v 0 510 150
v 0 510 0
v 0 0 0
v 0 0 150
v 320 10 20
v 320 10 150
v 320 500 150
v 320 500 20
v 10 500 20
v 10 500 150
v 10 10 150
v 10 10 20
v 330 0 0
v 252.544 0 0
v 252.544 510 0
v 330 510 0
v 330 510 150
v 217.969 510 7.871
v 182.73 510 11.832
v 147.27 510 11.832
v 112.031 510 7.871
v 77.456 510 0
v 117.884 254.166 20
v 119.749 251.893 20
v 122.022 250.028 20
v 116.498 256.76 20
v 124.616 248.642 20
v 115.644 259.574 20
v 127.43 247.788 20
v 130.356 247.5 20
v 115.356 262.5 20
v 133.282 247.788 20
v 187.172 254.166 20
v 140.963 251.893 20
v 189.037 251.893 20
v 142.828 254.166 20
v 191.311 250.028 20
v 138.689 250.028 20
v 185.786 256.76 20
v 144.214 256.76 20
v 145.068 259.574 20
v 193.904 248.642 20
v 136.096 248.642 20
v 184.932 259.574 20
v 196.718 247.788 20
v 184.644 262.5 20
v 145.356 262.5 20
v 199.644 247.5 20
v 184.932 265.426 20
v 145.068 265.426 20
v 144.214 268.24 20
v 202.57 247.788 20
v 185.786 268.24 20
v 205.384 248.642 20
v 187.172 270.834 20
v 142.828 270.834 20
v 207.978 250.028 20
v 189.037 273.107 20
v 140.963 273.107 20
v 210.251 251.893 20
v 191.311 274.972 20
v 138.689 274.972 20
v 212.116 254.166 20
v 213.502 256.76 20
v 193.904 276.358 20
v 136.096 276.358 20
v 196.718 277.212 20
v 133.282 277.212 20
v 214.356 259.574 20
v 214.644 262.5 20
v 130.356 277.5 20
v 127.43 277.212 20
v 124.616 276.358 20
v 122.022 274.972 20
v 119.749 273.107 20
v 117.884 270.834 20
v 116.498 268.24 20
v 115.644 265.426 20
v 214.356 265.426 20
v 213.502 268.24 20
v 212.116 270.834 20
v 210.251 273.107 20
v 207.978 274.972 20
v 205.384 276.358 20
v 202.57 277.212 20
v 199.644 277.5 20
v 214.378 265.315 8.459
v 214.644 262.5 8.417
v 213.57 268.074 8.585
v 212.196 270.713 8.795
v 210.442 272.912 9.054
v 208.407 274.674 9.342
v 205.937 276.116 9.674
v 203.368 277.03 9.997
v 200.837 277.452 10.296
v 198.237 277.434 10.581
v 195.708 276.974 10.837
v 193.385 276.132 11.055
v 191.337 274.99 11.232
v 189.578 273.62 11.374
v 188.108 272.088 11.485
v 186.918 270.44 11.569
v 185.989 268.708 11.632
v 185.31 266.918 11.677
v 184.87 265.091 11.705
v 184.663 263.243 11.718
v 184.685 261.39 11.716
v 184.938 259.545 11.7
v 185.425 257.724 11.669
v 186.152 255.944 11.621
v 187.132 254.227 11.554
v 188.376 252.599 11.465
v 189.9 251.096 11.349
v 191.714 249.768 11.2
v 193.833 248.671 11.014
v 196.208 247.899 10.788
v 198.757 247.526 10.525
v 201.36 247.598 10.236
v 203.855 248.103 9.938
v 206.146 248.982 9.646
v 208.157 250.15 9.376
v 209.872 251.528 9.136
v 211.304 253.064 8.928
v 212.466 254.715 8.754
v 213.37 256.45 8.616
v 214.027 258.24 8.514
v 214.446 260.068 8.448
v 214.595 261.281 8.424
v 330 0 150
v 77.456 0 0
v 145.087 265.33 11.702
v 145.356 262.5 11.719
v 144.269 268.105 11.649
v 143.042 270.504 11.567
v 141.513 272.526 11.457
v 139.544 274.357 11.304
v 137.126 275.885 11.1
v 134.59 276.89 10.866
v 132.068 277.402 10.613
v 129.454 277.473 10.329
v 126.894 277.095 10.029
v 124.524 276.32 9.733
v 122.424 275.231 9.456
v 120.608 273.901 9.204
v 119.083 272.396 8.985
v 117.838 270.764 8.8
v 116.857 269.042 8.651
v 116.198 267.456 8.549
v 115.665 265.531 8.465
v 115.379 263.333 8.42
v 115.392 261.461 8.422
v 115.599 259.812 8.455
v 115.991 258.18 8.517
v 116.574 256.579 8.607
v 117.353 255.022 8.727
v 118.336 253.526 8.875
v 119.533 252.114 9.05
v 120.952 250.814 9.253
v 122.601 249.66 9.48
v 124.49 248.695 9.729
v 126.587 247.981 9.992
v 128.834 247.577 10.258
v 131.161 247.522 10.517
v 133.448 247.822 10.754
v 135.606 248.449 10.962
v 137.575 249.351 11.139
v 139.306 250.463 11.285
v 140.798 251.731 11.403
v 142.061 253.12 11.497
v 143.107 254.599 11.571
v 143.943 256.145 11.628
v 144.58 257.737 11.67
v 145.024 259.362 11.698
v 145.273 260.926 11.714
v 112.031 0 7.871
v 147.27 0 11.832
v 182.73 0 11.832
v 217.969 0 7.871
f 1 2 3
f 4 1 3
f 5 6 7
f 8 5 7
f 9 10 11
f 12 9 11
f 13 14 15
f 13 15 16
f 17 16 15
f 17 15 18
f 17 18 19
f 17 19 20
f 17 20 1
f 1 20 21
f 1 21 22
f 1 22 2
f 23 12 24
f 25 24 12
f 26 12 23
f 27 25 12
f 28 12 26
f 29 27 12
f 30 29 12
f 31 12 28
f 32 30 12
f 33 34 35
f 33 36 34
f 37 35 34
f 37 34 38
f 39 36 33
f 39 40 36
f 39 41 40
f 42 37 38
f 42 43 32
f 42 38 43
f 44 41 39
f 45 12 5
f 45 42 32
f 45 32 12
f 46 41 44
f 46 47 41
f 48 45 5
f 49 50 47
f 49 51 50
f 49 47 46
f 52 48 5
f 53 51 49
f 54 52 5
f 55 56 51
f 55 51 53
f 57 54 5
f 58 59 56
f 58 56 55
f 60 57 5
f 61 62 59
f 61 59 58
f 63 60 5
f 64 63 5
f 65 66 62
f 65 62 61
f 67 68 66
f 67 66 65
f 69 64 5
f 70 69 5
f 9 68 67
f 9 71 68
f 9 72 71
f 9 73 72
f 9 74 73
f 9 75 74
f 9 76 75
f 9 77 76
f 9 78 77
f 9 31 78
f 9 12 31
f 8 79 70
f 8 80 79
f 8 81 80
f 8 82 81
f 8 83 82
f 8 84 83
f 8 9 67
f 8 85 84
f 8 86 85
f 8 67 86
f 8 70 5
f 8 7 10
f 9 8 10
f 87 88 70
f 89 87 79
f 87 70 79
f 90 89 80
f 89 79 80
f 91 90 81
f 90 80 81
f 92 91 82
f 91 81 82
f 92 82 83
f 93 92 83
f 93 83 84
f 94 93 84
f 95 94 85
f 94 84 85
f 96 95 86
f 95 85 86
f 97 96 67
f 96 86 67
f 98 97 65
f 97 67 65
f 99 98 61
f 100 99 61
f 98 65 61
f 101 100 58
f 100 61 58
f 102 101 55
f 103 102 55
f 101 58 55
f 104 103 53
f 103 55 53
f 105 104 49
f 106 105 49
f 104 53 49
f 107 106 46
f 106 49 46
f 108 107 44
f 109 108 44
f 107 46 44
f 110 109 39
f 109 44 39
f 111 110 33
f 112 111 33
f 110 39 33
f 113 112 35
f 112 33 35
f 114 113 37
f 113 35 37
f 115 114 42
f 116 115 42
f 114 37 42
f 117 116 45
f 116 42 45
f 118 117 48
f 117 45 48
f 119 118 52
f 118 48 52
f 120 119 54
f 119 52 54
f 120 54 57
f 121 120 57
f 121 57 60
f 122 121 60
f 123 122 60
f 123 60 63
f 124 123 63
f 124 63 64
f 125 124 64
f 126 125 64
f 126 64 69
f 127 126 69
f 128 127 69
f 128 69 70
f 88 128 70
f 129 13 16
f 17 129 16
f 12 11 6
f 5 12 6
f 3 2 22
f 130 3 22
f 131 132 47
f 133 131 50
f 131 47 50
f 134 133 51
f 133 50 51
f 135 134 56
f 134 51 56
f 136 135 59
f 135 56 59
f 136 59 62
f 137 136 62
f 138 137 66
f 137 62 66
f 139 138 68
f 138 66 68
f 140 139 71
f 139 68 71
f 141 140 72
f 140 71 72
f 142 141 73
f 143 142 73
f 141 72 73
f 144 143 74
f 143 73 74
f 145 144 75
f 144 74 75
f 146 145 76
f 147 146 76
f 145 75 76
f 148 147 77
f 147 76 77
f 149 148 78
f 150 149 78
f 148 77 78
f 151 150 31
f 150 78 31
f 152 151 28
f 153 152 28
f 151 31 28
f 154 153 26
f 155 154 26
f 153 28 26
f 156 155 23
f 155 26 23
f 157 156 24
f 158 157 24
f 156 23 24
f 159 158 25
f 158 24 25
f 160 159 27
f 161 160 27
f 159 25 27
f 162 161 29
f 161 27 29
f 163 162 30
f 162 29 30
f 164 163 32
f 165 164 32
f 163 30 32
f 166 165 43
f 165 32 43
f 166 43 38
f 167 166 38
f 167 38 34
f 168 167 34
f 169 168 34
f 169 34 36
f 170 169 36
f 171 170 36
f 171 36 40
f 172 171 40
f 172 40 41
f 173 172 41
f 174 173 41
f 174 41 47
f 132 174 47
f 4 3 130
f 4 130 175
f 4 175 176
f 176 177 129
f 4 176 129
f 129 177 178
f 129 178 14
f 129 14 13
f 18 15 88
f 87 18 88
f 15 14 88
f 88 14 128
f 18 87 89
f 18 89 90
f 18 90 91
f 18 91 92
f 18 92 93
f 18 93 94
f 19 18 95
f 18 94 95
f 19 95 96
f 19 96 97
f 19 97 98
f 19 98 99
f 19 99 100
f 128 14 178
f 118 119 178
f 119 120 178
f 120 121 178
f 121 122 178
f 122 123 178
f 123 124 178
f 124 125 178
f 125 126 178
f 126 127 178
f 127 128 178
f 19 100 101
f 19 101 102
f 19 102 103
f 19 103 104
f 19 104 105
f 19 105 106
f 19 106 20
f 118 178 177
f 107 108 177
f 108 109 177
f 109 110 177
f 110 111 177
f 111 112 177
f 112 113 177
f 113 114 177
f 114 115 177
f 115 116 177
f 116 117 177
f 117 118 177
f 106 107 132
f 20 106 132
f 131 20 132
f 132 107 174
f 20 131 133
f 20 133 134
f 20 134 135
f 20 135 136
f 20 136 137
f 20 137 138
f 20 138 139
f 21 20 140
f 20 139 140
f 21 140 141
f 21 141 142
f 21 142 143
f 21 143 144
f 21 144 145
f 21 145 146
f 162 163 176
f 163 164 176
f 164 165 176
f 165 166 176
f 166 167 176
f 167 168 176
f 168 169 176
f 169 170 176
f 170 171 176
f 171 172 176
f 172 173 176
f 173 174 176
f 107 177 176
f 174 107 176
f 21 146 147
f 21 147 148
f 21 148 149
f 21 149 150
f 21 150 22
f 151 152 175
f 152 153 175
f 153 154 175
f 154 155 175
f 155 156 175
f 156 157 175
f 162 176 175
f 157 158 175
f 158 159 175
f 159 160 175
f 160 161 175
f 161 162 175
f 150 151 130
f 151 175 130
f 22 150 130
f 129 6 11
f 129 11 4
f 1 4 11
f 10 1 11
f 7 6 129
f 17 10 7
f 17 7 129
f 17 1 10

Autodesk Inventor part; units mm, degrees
ref_plane "YZ Plane" through (0, 0, 0) normal (1, 0, 0) x (0, 1, 0)
ref_plane "XZ Plane" through (0, 0, 0) normal (0, 1, 0) x (-1, 0, 0)
ref_plane "XY Plane" through (0, 0, 0) normal (0, 0, 1) x (1, 0, 0)
sketch "Sketch1" plane through (0, 0, 0) normal (0, 0, 1) x (1, 0, 0)
  line L0 (0, 0) -> (330, 0)
  line L1 (330, 0) -> (330, 510)
  line L2 (330, 510) -> (0, 510)
  line L3 (0, 510) -> (0, 0)
  dimension "d0" = 330
  dimension "d1" = 510
extrude "Extrusion1" add sketch "Sketch1" along normal blind 150
sketch "Sketch2" plane through (0, 0, 0) normal (0, -1, 0) x (1, 0, 0)
  circle A0 centre (165, -304.672) radius 315
  line L0 (85, 0) -> (245, 0)
  line L1 (0, 0) -> (330, 0) projected
  circle A1 centre (165, -304.672) radius 317
  point P0 (165, 0)
  point P1 (165, 0)
  dimension "d4" = 630
  dimension "d8" = 160
  dimension "d9" = 2
extrude "Extrusion2" cut sketch "Sketch2" against normal through all
sketch "Sketch3" plane through (0, 0, 150) normal (0, 0, 1) x (1, 0, 0)
  line L0 (0, 0) -> (330, 0) projected
  line L1 (330, 0) -> (330, 510) projected
  line L2 (330, 510) -> (0, 510) projected
  line L3 (0, 510) -> (0, 0) projected
  line L4 (10, 10) -> (320, 10)
  line L5 (320, 10) -> (320, 500)
  line L6 (320, 500) -> (10, 500)
  line L7 (10, 500) -> (10, 10)
  dimension "d10" = 10
extrude "Extrusion3" cut sketch "Sketch3" against normal blind 130 contours L7 L6 L5 L4
sketch "Sketch4" plane through (0, 0, 20) normal (0, 0, 1) x (1, 0, 0)
  line L0 (10, 500) -> (320, 500) construction
  line L1 (85, 500) -> (245, 500) construction
  line L2 (245, 500) -> (245, 10) construction
  line L3 (245, 10) -> (85, 10) construction
  line L4 (85, 10) -> (85, 500) construction
  line L5 (320, 10) -> (10, 10) construction
  line L6 (85, 500) -> (245, 500) construction
  line L7 (245, 500) -> (245, 455) construction
  line L8 (245, 455) -> (85, 455) construction
  line L9 (85, 455) -> (85, 500) construction
  line L10 (85, 455) -> (245, 455) construction
  line L11 (245, 455) -> (245, 400) construction
  line L12 (245, 400) -> (85, 400) construction
  line L13 (85, 400) -> (85, 455) construction
  line L14 (85, 400) -> (245, 400) construction
  line L15 (245, 400) -> (245, 345) construction
  line L16 (245, 345) -> (85, 345) construction
  line L17 (85, 345) -> (85, 400) construction
  line L18 (85, 345) -> (245, 345) construction
  line L19 (245, 345) -> (245, 290) construction
  line L20 (245, 290) -> (85, 290) construction
  line L21 (85, 290) -> (85, 345) construction
  line L22 (85, 290) -> (245, 290) construction
  line L23 (245, 290) -> (245, 235) construction
  line L24 (245, 235) -> (85, 235) construction
  line L25 (85, 235) -> (85, 290) construction
  circle A0 centre (130.3559, 262.5) radius 15
  circle A1 centre (199.6441, 262.5) radius 15
  line L26 (130.3559, 262.5) -> (199.6441, 262.5) construction
  point P0 (0, 0)
  point P1 (165, 500)
  point P2 (165, 500)
  point P3 (165, 262.5)
  point P4 (165, 235)
  point P5 (245, 262.5)
  dimension "d13" = 160
  dimension "d14" = 45
  dimension "d15" = 55
  dimension "d16" = 55
  dimension "d17" = 55
  dimension "d18" = 55
  dimension "d19" = 30
  dimension "d20" = 30
  dimension "d21" = 69.2883
extrude "Extrusion4" cut sketch "Sketch4" against normal through all
properties part number "CA002" material "ABS Plastic"
